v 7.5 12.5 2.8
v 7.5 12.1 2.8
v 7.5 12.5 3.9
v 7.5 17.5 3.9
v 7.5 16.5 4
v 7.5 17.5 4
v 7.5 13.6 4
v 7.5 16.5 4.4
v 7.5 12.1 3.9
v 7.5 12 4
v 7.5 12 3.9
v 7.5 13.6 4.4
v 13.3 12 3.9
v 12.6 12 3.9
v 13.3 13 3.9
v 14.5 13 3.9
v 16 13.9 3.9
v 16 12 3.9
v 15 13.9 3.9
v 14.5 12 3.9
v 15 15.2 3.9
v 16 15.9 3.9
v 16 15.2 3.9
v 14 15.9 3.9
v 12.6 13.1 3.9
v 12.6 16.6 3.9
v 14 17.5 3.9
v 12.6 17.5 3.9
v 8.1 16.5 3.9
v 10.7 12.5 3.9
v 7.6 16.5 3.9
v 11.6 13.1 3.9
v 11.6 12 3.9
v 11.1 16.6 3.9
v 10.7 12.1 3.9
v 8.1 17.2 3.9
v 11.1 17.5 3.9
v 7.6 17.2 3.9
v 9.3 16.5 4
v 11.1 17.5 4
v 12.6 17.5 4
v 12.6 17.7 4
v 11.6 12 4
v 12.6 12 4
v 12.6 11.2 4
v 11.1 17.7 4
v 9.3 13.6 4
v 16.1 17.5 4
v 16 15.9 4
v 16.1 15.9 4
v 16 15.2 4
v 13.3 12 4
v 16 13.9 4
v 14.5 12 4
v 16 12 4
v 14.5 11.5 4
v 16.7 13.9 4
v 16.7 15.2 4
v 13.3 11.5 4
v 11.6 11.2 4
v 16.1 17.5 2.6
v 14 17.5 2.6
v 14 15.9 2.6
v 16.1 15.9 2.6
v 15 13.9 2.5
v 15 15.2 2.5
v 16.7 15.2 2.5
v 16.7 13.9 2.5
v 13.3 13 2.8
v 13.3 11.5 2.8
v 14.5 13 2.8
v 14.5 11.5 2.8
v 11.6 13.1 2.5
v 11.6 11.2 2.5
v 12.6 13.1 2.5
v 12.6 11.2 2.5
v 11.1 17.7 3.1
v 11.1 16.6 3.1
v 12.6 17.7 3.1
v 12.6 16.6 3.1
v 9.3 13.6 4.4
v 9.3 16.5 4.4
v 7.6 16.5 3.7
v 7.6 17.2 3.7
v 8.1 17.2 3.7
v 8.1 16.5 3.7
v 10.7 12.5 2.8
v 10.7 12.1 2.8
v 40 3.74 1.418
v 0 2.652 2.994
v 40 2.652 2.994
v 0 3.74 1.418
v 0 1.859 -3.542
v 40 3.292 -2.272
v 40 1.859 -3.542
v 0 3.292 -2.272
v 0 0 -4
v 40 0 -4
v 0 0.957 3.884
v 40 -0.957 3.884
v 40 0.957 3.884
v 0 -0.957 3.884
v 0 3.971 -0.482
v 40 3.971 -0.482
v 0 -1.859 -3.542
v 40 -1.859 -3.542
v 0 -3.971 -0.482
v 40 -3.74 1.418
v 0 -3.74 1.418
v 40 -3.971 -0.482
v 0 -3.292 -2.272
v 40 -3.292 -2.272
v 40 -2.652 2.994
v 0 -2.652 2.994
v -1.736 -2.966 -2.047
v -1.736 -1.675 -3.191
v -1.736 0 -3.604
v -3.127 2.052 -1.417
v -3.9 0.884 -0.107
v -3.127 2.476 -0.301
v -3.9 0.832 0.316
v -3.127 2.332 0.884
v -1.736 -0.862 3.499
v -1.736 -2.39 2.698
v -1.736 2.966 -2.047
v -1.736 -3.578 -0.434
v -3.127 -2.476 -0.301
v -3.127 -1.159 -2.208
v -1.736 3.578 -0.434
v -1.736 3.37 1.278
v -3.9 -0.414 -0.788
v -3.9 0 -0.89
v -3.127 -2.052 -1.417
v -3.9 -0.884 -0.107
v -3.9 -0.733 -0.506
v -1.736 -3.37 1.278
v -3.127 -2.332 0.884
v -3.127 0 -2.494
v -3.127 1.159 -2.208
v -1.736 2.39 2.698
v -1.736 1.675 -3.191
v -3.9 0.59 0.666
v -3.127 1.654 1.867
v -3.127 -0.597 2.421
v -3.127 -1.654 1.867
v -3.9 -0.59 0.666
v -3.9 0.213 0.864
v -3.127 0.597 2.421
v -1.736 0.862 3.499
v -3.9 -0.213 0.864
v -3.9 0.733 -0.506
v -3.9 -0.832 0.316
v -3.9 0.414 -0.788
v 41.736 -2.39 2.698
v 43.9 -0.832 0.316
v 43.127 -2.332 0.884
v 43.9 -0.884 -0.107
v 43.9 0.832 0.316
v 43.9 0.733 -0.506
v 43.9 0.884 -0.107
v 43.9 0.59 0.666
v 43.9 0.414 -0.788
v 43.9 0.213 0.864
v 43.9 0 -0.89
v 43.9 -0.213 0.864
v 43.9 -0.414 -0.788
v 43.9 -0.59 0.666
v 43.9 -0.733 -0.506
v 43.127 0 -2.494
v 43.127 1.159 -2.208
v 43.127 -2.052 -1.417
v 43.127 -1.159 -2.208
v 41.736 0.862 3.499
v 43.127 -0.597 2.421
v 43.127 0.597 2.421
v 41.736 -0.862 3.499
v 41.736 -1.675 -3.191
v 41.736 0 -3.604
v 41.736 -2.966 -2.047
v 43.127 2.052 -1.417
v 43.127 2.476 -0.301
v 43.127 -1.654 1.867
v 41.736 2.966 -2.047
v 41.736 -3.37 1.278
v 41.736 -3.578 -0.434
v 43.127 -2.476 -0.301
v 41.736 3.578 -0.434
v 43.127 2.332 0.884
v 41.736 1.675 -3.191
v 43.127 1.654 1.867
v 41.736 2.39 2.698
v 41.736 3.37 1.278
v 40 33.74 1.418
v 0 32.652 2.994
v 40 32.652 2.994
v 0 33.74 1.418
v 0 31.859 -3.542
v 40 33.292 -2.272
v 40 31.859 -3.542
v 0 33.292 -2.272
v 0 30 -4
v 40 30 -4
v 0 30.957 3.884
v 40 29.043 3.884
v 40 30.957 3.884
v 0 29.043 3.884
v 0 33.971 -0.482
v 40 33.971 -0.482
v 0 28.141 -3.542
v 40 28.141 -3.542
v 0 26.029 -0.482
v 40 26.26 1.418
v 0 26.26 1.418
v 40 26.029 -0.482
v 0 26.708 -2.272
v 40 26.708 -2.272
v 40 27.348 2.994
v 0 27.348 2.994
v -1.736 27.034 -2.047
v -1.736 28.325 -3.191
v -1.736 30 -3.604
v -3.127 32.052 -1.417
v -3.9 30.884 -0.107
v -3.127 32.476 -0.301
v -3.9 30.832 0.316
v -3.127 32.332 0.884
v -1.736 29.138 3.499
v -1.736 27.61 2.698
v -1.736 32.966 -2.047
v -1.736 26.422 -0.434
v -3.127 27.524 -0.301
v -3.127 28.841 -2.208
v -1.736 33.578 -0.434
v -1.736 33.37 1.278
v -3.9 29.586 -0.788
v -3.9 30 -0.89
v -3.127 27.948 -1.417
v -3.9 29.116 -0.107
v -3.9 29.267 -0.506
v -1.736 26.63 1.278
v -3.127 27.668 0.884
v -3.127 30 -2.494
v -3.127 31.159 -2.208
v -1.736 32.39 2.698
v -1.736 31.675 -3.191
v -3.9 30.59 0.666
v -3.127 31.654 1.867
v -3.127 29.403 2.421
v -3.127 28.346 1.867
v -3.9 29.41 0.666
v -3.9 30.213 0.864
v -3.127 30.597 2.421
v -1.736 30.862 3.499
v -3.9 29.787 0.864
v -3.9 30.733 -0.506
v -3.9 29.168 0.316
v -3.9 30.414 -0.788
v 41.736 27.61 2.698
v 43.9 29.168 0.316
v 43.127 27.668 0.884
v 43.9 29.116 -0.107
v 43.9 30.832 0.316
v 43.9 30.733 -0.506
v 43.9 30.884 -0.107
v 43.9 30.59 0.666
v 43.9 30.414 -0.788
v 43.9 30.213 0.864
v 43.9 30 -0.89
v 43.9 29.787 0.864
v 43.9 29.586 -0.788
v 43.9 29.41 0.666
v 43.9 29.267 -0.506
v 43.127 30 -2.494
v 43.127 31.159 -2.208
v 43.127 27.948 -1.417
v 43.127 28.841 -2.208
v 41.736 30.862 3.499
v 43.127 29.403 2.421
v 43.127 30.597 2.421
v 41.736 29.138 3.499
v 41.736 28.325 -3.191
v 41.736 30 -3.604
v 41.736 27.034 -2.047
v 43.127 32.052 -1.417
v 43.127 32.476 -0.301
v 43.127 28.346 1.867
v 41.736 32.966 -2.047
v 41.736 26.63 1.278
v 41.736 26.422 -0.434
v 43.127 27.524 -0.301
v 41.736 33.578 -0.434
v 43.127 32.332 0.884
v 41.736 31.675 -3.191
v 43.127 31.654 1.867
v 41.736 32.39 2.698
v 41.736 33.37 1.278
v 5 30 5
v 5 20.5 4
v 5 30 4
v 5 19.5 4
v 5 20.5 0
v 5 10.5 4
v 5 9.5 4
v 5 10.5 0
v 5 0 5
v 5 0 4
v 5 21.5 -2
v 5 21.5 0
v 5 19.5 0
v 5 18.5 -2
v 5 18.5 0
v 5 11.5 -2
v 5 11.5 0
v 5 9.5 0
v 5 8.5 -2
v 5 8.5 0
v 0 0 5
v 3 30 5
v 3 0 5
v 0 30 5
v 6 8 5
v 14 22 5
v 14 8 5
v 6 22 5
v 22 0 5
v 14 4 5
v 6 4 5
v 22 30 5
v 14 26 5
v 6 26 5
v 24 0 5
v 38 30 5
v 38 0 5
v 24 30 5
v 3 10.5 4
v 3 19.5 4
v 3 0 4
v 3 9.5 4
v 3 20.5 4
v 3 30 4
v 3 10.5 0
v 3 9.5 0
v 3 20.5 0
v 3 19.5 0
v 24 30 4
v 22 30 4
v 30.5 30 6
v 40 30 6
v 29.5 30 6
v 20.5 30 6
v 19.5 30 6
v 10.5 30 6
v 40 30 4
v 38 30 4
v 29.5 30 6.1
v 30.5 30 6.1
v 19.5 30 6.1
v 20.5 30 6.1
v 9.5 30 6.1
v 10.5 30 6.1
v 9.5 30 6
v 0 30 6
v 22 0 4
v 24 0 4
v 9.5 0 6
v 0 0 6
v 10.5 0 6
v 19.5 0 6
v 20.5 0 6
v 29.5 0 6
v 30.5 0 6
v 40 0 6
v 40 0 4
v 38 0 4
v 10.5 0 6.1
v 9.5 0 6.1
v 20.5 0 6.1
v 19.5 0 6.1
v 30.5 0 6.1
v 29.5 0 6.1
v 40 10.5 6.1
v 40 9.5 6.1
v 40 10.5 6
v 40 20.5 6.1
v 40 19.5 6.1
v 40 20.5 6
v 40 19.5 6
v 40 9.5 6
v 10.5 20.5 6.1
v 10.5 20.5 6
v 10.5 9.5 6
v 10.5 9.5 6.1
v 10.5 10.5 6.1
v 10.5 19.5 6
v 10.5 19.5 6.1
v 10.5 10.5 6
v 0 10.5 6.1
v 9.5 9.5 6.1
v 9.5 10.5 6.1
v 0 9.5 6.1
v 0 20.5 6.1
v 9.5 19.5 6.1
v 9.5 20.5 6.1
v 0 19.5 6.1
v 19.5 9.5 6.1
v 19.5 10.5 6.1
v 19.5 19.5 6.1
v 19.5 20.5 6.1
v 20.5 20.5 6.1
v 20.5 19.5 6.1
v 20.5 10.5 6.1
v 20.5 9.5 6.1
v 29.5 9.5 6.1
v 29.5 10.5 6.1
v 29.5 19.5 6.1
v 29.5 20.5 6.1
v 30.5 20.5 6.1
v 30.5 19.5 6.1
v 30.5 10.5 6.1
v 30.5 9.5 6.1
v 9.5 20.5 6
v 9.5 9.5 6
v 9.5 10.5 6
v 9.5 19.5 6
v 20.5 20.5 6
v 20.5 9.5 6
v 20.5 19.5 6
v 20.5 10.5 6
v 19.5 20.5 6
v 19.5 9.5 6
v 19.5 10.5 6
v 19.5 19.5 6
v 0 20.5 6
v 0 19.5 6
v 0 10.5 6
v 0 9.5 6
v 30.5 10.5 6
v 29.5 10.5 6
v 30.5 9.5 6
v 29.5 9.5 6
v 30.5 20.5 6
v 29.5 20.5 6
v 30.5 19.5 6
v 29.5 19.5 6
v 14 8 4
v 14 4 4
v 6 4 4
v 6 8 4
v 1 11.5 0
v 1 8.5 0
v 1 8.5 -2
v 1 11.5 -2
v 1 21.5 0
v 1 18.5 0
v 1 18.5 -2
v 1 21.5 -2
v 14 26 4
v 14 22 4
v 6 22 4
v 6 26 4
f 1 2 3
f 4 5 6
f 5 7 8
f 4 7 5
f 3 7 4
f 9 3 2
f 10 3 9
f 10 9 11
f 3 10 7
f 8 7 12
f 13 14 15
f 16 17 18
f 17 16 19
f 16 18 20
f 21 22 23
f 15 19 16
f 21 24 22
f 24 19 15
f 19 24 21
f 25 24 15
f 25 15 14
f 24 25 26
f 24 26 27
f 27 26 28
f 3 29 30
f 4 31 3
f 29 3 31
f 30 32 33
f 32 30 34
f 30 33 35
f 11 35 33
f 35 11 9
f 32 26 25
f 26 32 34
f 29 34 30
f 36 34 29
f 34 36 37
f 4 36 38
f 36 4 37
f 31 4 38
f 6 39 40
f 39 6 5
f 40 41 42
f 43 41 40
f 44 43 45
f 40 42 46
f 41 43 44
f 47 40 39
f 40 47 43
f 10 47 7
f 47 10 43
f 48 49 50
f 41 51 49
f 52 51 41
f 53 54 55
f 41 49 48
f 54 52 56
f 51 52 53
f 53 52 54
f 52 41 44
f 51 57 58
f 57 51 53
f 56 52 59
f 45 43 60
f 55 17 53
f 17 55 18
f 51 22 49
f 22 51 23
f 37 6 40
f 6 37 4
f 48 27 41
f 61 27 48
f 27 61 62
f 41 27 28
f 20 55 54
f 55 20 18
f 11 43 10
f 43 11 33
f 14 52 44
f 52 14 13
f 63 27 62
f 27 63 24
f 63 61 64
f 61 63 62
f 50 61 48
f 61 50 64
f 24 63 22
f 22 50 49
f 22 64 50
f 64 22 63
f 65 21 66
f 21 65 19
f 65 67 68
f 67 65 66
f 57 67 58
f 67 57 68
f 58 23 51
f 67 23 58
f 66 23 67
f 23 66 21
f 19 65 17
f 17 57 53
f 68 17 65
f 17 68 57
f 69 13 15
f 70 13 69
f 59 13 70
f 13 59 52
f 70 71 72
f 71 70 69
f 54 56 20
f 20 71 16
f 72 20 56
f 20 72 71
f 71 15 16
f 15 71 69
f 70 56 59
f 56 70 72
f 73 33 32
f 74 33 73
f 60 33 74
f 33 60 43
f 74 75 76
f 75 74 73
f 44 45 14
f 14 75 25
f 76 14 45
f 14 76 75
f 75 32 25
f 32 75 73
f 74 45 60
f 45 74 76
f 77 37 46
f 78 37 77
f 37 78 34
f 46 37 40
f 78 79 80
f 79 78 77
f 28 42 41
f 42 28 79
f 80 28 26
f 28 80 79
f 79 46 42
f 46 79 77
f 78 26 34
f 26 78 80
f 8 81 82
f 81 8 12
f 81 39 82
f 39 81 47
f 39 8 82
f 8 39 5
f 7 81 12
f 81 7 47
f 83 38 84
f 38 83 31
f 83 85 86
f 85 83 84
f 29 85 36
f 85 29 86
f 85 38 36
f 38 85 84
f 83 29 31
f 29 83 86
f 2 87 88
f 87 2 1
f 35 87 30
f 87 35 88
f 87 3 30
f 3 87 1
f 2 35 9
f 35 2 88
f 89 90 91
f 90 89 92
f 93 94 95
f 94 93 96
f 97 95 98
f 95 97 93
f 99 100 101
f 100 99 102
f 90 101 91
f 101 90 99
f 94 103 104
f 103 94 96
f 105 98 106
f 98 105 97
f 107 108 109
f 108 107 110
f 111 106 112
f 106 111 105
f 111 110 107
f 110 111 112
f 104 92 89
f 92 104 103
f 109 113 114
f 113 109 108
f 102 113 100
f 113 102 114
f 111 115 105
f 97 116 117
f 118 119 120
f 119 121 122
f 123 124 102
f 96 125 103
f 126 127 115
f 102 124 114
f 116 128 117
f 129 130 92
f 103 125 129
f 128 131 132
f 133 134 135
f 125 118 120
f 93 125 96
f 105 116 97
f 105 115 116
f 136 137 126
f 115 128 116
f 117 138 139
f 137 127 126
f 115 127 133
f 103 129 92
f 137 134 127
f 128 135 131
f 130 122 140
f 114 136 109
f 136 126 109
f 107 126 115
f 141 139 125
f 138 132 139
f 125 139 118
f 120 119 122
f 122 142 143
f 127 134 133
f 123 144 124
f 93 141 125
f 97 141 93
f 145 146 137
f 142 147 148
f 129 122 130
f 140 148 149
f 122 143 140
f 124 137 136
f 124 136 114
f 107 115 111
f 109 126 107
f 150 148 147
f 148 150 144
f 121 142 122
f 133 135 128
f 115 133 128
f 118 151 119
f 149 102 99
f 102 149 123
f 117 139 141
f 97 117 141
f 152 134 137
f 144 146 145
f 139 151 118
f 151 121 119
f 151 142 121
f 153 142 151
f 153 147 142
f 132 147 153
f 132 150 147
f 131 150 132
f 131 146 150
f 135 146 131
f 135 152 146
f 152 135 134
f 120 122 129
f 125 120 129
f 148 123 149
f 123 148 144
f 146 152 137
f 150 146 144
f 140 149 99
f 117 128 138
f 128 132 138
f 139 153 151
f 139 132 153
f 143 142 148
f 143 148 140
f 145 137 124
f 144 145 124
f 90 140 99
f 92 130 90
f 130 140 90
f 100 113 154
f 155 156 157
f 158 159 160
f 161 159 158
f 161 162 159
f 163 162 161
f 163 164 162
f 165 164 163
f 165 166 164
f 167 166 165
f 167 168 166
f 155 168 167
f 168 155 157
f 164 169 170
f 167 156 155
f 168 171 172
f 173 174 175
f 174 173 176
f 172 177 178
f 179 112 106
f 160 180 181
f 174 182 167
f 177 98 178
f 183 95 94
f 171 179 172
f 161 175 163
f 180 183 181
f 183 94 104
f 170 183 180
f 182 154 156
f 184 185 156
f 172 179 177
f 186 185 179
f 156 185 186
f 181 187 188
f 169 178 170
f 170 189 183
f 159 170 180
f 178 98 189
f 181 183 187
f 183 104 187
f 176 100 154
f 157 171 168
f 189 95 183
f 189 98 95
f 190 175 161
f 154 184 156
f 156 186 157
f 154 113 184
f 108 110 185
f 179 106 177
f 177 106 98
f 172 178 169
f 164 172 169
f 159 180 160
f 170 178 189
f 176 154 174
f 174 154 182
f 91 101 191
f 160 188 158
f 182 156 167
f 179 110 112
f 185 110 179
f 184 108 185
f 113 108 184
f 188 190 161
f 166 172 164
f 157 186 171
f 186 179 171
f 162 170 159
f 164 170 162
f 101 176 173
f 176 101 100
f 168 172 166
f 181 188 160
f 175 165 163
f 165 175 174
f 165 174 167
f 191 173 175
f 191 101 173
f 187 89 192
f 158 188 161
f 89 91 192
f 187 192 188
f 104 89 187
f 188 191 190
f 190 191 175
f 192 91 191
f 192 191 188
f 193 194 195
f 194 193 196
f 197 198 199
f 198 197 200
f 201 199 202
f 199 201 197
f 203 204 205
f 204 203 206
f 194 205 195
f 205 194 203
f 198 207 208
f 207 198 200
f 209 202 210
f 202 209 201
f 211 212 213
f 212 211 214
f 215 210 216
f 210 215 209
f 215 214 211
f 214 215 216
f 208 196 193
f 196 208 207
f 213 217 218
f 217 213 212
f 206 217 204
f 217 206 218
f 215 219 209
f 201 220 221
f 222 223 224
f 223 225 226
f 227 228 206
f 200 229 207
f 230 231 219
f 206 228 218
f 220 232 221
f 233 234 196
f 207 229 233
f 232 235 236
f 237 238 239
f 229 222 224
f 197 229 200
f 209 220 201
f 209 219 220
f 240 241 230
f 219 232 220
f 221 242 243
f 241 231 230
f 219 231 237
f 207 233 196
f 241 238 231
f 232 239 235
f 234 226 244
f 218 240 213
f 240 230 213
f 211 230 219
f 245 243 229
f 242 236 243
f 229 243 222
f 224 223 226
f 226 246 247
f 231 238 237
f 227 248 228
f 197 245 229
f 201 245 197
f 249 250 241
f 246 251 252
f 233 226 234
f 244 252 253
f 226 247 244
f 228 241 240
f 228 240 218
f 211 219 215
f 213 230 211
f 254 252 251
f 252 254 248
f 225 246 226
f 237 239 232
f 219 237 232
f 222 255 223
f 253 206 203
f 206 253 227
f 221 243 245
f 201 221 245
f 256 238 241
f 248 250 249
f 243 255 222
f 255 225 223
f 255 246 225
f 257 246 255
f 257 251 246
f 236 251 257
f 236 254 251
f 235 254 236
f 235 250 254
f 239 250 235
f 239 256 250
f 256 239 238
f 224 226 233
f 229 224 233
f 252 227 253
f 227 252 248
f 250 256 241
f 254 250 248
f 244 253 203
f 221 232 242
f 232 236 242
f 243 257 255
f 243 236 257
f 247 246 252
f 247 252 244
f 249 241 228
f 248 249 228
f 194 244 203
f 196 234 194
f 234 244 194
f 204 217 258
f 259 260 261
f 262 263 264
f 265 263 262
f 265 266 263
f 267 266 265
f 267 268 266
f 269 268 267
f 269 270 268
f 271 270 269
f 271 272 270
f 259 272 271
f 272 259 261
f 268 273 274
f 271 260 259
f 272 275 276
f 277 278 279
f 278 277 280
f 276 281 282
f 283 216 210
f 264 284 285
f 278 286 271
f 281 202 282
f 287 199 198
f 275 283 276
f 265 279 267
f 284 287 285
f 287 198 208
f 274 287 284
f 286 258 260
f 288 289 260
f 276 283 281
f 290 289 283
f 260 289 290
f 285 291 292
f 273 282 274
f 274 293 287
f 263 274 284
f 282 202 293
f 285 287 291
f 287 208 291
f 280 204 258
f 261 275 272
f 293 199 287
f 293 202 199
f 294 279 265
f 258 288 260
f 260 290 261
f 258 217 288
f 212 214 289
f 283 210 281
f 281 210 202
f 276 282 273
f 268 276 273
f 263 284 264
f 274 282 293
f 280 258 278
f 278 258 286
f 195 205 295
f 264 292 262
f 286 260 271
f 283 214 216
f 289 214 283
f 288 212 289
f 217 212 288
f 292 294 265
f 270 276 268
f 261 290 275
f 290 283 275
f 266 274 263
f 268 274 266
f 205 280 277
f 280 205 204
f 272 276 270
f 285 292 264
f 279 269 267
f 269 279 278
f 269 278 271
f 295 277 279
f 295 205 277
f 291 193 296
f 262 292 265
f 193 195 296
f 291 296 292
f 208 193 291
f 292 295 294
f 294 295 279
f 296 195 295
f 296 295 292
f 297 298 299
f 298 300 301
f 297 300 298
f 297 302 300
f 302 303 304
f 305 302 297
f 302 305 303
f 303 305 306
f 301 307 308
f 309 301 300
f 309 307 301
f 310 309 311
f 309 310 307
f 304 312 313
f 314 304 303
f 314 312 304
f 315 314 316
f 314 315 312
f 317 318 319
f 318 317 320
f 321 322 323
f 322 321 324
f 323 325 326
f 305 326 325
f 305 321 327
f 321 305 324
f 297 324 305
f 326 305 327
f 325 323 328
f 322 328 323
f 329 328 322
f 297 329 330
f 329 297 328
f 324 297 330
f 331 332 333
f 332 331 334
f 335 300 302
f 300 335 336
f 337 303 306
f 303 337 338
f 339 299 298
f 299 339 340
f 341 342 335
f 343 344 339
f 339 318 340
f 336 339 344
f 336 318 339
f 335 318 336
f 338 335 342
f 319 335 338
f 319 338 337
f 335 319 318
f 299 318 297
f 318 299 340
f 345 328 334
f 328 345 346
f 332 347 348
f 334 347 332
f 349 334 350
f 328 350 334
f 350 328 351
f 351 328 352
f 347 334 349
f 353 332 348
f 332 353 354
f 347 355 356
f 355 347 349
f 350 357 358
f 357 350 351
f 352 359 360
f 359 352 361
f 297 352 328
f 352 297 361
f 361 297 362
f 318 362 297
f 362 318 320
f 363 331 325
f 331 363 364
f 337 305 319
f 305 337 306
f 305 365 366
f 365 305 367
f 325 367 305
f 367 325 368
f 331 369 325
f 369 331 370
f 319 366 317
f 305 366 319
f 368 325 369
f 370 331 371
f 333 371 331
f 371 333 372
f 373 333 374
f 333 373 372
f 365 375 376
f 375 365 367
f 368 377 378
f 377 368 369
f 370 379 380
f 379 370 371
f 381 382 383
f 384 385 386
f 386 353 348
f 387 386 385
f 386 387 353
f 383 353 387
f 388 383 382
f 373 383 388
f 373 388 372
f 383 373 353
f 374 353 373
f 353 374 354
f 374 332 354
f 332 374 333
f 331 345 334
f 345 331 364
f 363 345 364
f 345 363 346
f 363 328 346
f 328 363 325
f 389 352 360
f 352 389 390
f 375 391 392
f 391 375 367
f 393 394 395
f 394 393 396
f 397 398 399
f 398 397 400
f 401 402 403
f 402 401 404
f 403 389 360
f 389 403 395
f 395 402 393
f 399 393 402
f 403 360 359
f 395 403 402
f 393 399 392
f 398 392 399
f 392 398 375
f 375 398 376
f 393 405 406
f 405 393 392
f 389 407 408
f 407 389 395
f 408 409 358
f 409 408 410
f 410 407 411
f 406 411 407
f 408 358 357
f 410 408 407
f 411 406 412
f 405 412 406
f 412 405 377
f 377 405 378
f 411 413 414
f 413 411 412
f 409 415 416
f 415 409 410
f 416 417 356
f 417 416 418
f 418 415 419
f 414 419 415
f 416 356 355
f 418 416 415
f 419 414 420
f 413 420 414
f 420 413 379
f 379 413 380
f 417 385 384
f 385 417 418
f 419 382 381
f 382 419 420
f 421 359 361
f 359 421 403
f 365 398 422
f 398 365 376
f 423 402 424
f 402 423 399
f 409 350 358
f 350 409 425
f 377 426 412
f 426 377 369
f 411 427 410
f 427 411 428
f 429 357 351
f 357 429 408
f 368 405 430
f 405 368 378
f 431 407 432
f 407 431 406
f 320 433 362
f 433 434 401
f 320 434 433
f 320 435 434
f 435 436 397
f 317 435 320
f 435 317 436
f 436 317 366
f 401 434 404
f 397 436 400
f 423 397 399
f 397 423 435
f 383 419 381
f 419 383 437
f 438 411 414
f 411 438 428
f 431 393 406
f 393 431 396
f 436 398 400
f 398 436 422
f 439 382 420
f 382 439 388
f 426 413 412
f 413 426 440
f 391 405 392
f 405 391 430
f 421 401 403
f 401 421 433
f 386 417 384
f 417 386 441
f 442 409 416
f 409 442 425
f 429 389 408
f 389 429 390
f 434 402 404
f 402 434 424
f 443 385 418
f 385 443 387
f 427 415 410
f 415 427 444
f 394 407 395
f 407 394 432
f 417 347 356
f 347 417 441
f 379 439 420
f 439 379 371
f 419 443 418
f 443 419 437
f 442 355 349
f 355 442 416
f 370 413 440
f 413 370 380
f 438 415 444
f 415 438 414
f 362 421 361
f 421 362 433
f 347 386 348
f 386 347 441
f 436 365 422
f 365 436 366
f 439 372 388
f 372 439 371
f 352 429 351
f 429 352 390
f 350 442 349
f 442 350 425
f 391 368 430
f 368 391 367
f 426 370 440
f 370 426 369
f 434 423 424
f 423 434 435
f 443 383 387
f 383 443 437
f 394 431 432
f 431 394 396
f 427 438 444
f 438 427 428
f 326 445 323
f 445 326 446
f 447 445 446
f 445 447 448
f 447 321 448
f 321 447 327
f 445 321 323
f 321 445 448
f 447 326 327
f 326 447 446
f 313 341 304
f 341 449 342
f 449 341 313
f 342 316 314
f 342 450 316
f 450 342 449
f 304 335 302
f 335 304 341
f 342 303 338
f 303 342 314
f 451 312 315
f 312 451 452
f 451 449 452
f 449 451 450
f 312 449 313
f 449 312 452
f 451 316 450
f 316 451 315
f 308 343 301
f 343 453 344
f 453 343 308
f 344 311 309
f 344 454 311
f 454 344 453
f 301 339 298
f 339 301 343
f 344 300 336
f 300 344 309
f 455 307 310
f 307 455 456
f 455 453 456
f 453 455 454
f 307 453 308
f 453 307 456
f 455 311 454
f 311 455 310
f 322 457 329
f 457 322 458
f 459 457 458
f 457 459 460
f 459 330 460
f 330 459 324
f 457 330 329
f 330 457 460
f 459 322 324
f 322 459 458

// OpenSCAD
union() {
	union() {
		translate(v = [16, 12, 4]) {
			rotate(a = [0, 180, 0]) {
				union() {
					union() {
						union() {
							color(c = [0, 0.7000000000, 0.1000000000]) {
								cube(size = [8.5000000000, 5.5000000000, 0.1000000000]);
							}
							color(c = [0.8196078431, 0.8196078431, 0.8196078431]) {
								translate(v = [-0.1000000000, 3.9000000000, 0]) {
									cube(size = [2.1000000000, 1.6000000000, 1.4000000000]);
								}
							}
						}
						union() {
							translate(v = [-0.7000000000, 1.9000000000, 0]) {
								color(c = [0.8196078431, 0.8196078431, 0.8196078431]) {
									cube(size = [1.7000000000, 1.3000000000, 1.5000000000]);
								}
							}
							translate(v = [1.5000000000, -0.5000000000, 0]) {
								color(c = [0, 0, 0]) {
									cube(size = [1.2000000000, 1.5000000000, 1.2000000000]);
								}
							}
						}
					}
					union() {
						union() {
							translate(v = [3.4000000000, -0.8000000000, 0]) {
								color(c = [1.0000000000, 0.7372549020, 0.2352941176]) {
									cube(size = [1, 1.9000000000, 1.5000000000]);
								}
							}
							translate(v = [3.4000000000, 4.6000000000, 0]) {
								color(c = [0.8196078431, 0.8196078431, 0.8196078431]) {
									cube(size = [1.5000000000, 1.1000000000, 0.9000000000]);
								}
							}
						}
						union() {
							translate(v = [5.3000000000, 0.1000000000, 0]) {
								color(c = [0, 0, 0]) {
									cube(size = [3.2000000000, 0.4000000000, 1.2000000000]);
								}
							}
							union() {
								translate(v = [6.7000000000, 1.6000000000, -0.4000000000]) {
									color(c = [0, 0, 0]) {
										cube(size = [1.8000000000, 2.9000000000, 0.4000000000]);
									}
								}
								translate(v = [7.9000000000, 4.5000000000, 0]) {
									color(c = [0, 0, 0]) {
										cube(size = [0.5000000000, 0.7000000000, 0.3000000000]);
									}
								}
							}
						}
					}
				}
			}
		}
		union() {
			color(c = "Gainsboro") {
				union() {
					rotate(a = [0, 90, 0]) {
						union() {
							union() {
								cylinder(h = 40, r = 4);
								sphere(r = 4);
							}
							translate(v = [0, 0, 40]) {
								sphere(r = 4);
							}
						}
					}
					translate(v = [0, 30, 0]) {
						rotate(a = [0, 90, 0]) {
							union() {
								union() {
									cylinder(h = 40, r = 4);
									sphere(r = 4);
								}
								translate(v = [0, 0, 40]) {
									sphere(r = 4);
								}
							}
						}
					}
				}
			}
			color(c = "Gray") {
				union() {
					union() {
						translate(v = [3, 0, 4]) {
							cube(size = [2, 30, 1]);
						}
						translate(v = [35, 0, 0]) {
							translate(v = [3, 0, 4]) {
								cube(size = [2, 30, 1]);
							}
						}
					}
					translate(v = [19, 0, 0]) {
						translate(v = [3, 0, 4]) {
							cube(size = [2, 30, 1]);
						}
					}
				}
			}
		}
	}
	union() {
		union() {
			translate(v = [0, 0, 5]) {
				union() {
					color(c = "Black") {
						cube(size = [40, 30, 1]);
					}
					union() {
						union() {
							translate(v = [9.5000000000, 0, 0]) {
								color(c = "Silver") {
									cube(size = [1, 30, 1.1000000000]);
								}
							}
							translate(v = [19.5000000000, 0, 0]) {
								color(c = "Silver") {
									cube(size = [1, 30, 1.1000000000]);
								}
							}
						}
						union() {
							translate(v = [29.5000000000, 0, 0]) {
								color(c = "Silver") {
									cube(size = [1, 30, 1.1000000000]);
								}
							}
							union() {
								translate(v = [0, 9.5000000000, 0]) {
									color(c = "Silver") {
										cube(size = [40, 1, 1.1000000000]);
									}
								}
								translate(v = [0, 19.5000000000, 0]) {
									color(c = "Silver") {
										cube(size = [40, 1, 1.1000000000]);
									}
								}
							}
						}
					}
				}
			}
			translate(v = [6, 4, 4]) {
				color(c = "Red") {
					cube(size = [8, 4, 1]);
				}
			}
		}
		union() {
			translate(v = [0, 18, 0]) {
				translate(v = [6, 4, 4]) {
					color(c = "Red") {
						cube(size = [8, 4, 1]);
					}
				}
			}
			color(c = "Blue") {
				union() {
					union() {
						translate(v = [3, 9.5000000000, 0]) {
							cube(size = [2, 1, 4]);
						}
						translate(v = [1, 8.5000000000, -2]) {
							cube(size = [4, 3, 2]);
						}
					}
					translate(v = [0, 10, 0]) {
						union() {
							translate(v = [3, 9.5000000000, 0]) {
								cube(size = [2, 1, 4]);
							}
							translate(v = [1, 8.5000000000, -2]) {
								cube(size = [4, 3, 2]);
							}
						}
					}
				}
			}
		}
	}
}
